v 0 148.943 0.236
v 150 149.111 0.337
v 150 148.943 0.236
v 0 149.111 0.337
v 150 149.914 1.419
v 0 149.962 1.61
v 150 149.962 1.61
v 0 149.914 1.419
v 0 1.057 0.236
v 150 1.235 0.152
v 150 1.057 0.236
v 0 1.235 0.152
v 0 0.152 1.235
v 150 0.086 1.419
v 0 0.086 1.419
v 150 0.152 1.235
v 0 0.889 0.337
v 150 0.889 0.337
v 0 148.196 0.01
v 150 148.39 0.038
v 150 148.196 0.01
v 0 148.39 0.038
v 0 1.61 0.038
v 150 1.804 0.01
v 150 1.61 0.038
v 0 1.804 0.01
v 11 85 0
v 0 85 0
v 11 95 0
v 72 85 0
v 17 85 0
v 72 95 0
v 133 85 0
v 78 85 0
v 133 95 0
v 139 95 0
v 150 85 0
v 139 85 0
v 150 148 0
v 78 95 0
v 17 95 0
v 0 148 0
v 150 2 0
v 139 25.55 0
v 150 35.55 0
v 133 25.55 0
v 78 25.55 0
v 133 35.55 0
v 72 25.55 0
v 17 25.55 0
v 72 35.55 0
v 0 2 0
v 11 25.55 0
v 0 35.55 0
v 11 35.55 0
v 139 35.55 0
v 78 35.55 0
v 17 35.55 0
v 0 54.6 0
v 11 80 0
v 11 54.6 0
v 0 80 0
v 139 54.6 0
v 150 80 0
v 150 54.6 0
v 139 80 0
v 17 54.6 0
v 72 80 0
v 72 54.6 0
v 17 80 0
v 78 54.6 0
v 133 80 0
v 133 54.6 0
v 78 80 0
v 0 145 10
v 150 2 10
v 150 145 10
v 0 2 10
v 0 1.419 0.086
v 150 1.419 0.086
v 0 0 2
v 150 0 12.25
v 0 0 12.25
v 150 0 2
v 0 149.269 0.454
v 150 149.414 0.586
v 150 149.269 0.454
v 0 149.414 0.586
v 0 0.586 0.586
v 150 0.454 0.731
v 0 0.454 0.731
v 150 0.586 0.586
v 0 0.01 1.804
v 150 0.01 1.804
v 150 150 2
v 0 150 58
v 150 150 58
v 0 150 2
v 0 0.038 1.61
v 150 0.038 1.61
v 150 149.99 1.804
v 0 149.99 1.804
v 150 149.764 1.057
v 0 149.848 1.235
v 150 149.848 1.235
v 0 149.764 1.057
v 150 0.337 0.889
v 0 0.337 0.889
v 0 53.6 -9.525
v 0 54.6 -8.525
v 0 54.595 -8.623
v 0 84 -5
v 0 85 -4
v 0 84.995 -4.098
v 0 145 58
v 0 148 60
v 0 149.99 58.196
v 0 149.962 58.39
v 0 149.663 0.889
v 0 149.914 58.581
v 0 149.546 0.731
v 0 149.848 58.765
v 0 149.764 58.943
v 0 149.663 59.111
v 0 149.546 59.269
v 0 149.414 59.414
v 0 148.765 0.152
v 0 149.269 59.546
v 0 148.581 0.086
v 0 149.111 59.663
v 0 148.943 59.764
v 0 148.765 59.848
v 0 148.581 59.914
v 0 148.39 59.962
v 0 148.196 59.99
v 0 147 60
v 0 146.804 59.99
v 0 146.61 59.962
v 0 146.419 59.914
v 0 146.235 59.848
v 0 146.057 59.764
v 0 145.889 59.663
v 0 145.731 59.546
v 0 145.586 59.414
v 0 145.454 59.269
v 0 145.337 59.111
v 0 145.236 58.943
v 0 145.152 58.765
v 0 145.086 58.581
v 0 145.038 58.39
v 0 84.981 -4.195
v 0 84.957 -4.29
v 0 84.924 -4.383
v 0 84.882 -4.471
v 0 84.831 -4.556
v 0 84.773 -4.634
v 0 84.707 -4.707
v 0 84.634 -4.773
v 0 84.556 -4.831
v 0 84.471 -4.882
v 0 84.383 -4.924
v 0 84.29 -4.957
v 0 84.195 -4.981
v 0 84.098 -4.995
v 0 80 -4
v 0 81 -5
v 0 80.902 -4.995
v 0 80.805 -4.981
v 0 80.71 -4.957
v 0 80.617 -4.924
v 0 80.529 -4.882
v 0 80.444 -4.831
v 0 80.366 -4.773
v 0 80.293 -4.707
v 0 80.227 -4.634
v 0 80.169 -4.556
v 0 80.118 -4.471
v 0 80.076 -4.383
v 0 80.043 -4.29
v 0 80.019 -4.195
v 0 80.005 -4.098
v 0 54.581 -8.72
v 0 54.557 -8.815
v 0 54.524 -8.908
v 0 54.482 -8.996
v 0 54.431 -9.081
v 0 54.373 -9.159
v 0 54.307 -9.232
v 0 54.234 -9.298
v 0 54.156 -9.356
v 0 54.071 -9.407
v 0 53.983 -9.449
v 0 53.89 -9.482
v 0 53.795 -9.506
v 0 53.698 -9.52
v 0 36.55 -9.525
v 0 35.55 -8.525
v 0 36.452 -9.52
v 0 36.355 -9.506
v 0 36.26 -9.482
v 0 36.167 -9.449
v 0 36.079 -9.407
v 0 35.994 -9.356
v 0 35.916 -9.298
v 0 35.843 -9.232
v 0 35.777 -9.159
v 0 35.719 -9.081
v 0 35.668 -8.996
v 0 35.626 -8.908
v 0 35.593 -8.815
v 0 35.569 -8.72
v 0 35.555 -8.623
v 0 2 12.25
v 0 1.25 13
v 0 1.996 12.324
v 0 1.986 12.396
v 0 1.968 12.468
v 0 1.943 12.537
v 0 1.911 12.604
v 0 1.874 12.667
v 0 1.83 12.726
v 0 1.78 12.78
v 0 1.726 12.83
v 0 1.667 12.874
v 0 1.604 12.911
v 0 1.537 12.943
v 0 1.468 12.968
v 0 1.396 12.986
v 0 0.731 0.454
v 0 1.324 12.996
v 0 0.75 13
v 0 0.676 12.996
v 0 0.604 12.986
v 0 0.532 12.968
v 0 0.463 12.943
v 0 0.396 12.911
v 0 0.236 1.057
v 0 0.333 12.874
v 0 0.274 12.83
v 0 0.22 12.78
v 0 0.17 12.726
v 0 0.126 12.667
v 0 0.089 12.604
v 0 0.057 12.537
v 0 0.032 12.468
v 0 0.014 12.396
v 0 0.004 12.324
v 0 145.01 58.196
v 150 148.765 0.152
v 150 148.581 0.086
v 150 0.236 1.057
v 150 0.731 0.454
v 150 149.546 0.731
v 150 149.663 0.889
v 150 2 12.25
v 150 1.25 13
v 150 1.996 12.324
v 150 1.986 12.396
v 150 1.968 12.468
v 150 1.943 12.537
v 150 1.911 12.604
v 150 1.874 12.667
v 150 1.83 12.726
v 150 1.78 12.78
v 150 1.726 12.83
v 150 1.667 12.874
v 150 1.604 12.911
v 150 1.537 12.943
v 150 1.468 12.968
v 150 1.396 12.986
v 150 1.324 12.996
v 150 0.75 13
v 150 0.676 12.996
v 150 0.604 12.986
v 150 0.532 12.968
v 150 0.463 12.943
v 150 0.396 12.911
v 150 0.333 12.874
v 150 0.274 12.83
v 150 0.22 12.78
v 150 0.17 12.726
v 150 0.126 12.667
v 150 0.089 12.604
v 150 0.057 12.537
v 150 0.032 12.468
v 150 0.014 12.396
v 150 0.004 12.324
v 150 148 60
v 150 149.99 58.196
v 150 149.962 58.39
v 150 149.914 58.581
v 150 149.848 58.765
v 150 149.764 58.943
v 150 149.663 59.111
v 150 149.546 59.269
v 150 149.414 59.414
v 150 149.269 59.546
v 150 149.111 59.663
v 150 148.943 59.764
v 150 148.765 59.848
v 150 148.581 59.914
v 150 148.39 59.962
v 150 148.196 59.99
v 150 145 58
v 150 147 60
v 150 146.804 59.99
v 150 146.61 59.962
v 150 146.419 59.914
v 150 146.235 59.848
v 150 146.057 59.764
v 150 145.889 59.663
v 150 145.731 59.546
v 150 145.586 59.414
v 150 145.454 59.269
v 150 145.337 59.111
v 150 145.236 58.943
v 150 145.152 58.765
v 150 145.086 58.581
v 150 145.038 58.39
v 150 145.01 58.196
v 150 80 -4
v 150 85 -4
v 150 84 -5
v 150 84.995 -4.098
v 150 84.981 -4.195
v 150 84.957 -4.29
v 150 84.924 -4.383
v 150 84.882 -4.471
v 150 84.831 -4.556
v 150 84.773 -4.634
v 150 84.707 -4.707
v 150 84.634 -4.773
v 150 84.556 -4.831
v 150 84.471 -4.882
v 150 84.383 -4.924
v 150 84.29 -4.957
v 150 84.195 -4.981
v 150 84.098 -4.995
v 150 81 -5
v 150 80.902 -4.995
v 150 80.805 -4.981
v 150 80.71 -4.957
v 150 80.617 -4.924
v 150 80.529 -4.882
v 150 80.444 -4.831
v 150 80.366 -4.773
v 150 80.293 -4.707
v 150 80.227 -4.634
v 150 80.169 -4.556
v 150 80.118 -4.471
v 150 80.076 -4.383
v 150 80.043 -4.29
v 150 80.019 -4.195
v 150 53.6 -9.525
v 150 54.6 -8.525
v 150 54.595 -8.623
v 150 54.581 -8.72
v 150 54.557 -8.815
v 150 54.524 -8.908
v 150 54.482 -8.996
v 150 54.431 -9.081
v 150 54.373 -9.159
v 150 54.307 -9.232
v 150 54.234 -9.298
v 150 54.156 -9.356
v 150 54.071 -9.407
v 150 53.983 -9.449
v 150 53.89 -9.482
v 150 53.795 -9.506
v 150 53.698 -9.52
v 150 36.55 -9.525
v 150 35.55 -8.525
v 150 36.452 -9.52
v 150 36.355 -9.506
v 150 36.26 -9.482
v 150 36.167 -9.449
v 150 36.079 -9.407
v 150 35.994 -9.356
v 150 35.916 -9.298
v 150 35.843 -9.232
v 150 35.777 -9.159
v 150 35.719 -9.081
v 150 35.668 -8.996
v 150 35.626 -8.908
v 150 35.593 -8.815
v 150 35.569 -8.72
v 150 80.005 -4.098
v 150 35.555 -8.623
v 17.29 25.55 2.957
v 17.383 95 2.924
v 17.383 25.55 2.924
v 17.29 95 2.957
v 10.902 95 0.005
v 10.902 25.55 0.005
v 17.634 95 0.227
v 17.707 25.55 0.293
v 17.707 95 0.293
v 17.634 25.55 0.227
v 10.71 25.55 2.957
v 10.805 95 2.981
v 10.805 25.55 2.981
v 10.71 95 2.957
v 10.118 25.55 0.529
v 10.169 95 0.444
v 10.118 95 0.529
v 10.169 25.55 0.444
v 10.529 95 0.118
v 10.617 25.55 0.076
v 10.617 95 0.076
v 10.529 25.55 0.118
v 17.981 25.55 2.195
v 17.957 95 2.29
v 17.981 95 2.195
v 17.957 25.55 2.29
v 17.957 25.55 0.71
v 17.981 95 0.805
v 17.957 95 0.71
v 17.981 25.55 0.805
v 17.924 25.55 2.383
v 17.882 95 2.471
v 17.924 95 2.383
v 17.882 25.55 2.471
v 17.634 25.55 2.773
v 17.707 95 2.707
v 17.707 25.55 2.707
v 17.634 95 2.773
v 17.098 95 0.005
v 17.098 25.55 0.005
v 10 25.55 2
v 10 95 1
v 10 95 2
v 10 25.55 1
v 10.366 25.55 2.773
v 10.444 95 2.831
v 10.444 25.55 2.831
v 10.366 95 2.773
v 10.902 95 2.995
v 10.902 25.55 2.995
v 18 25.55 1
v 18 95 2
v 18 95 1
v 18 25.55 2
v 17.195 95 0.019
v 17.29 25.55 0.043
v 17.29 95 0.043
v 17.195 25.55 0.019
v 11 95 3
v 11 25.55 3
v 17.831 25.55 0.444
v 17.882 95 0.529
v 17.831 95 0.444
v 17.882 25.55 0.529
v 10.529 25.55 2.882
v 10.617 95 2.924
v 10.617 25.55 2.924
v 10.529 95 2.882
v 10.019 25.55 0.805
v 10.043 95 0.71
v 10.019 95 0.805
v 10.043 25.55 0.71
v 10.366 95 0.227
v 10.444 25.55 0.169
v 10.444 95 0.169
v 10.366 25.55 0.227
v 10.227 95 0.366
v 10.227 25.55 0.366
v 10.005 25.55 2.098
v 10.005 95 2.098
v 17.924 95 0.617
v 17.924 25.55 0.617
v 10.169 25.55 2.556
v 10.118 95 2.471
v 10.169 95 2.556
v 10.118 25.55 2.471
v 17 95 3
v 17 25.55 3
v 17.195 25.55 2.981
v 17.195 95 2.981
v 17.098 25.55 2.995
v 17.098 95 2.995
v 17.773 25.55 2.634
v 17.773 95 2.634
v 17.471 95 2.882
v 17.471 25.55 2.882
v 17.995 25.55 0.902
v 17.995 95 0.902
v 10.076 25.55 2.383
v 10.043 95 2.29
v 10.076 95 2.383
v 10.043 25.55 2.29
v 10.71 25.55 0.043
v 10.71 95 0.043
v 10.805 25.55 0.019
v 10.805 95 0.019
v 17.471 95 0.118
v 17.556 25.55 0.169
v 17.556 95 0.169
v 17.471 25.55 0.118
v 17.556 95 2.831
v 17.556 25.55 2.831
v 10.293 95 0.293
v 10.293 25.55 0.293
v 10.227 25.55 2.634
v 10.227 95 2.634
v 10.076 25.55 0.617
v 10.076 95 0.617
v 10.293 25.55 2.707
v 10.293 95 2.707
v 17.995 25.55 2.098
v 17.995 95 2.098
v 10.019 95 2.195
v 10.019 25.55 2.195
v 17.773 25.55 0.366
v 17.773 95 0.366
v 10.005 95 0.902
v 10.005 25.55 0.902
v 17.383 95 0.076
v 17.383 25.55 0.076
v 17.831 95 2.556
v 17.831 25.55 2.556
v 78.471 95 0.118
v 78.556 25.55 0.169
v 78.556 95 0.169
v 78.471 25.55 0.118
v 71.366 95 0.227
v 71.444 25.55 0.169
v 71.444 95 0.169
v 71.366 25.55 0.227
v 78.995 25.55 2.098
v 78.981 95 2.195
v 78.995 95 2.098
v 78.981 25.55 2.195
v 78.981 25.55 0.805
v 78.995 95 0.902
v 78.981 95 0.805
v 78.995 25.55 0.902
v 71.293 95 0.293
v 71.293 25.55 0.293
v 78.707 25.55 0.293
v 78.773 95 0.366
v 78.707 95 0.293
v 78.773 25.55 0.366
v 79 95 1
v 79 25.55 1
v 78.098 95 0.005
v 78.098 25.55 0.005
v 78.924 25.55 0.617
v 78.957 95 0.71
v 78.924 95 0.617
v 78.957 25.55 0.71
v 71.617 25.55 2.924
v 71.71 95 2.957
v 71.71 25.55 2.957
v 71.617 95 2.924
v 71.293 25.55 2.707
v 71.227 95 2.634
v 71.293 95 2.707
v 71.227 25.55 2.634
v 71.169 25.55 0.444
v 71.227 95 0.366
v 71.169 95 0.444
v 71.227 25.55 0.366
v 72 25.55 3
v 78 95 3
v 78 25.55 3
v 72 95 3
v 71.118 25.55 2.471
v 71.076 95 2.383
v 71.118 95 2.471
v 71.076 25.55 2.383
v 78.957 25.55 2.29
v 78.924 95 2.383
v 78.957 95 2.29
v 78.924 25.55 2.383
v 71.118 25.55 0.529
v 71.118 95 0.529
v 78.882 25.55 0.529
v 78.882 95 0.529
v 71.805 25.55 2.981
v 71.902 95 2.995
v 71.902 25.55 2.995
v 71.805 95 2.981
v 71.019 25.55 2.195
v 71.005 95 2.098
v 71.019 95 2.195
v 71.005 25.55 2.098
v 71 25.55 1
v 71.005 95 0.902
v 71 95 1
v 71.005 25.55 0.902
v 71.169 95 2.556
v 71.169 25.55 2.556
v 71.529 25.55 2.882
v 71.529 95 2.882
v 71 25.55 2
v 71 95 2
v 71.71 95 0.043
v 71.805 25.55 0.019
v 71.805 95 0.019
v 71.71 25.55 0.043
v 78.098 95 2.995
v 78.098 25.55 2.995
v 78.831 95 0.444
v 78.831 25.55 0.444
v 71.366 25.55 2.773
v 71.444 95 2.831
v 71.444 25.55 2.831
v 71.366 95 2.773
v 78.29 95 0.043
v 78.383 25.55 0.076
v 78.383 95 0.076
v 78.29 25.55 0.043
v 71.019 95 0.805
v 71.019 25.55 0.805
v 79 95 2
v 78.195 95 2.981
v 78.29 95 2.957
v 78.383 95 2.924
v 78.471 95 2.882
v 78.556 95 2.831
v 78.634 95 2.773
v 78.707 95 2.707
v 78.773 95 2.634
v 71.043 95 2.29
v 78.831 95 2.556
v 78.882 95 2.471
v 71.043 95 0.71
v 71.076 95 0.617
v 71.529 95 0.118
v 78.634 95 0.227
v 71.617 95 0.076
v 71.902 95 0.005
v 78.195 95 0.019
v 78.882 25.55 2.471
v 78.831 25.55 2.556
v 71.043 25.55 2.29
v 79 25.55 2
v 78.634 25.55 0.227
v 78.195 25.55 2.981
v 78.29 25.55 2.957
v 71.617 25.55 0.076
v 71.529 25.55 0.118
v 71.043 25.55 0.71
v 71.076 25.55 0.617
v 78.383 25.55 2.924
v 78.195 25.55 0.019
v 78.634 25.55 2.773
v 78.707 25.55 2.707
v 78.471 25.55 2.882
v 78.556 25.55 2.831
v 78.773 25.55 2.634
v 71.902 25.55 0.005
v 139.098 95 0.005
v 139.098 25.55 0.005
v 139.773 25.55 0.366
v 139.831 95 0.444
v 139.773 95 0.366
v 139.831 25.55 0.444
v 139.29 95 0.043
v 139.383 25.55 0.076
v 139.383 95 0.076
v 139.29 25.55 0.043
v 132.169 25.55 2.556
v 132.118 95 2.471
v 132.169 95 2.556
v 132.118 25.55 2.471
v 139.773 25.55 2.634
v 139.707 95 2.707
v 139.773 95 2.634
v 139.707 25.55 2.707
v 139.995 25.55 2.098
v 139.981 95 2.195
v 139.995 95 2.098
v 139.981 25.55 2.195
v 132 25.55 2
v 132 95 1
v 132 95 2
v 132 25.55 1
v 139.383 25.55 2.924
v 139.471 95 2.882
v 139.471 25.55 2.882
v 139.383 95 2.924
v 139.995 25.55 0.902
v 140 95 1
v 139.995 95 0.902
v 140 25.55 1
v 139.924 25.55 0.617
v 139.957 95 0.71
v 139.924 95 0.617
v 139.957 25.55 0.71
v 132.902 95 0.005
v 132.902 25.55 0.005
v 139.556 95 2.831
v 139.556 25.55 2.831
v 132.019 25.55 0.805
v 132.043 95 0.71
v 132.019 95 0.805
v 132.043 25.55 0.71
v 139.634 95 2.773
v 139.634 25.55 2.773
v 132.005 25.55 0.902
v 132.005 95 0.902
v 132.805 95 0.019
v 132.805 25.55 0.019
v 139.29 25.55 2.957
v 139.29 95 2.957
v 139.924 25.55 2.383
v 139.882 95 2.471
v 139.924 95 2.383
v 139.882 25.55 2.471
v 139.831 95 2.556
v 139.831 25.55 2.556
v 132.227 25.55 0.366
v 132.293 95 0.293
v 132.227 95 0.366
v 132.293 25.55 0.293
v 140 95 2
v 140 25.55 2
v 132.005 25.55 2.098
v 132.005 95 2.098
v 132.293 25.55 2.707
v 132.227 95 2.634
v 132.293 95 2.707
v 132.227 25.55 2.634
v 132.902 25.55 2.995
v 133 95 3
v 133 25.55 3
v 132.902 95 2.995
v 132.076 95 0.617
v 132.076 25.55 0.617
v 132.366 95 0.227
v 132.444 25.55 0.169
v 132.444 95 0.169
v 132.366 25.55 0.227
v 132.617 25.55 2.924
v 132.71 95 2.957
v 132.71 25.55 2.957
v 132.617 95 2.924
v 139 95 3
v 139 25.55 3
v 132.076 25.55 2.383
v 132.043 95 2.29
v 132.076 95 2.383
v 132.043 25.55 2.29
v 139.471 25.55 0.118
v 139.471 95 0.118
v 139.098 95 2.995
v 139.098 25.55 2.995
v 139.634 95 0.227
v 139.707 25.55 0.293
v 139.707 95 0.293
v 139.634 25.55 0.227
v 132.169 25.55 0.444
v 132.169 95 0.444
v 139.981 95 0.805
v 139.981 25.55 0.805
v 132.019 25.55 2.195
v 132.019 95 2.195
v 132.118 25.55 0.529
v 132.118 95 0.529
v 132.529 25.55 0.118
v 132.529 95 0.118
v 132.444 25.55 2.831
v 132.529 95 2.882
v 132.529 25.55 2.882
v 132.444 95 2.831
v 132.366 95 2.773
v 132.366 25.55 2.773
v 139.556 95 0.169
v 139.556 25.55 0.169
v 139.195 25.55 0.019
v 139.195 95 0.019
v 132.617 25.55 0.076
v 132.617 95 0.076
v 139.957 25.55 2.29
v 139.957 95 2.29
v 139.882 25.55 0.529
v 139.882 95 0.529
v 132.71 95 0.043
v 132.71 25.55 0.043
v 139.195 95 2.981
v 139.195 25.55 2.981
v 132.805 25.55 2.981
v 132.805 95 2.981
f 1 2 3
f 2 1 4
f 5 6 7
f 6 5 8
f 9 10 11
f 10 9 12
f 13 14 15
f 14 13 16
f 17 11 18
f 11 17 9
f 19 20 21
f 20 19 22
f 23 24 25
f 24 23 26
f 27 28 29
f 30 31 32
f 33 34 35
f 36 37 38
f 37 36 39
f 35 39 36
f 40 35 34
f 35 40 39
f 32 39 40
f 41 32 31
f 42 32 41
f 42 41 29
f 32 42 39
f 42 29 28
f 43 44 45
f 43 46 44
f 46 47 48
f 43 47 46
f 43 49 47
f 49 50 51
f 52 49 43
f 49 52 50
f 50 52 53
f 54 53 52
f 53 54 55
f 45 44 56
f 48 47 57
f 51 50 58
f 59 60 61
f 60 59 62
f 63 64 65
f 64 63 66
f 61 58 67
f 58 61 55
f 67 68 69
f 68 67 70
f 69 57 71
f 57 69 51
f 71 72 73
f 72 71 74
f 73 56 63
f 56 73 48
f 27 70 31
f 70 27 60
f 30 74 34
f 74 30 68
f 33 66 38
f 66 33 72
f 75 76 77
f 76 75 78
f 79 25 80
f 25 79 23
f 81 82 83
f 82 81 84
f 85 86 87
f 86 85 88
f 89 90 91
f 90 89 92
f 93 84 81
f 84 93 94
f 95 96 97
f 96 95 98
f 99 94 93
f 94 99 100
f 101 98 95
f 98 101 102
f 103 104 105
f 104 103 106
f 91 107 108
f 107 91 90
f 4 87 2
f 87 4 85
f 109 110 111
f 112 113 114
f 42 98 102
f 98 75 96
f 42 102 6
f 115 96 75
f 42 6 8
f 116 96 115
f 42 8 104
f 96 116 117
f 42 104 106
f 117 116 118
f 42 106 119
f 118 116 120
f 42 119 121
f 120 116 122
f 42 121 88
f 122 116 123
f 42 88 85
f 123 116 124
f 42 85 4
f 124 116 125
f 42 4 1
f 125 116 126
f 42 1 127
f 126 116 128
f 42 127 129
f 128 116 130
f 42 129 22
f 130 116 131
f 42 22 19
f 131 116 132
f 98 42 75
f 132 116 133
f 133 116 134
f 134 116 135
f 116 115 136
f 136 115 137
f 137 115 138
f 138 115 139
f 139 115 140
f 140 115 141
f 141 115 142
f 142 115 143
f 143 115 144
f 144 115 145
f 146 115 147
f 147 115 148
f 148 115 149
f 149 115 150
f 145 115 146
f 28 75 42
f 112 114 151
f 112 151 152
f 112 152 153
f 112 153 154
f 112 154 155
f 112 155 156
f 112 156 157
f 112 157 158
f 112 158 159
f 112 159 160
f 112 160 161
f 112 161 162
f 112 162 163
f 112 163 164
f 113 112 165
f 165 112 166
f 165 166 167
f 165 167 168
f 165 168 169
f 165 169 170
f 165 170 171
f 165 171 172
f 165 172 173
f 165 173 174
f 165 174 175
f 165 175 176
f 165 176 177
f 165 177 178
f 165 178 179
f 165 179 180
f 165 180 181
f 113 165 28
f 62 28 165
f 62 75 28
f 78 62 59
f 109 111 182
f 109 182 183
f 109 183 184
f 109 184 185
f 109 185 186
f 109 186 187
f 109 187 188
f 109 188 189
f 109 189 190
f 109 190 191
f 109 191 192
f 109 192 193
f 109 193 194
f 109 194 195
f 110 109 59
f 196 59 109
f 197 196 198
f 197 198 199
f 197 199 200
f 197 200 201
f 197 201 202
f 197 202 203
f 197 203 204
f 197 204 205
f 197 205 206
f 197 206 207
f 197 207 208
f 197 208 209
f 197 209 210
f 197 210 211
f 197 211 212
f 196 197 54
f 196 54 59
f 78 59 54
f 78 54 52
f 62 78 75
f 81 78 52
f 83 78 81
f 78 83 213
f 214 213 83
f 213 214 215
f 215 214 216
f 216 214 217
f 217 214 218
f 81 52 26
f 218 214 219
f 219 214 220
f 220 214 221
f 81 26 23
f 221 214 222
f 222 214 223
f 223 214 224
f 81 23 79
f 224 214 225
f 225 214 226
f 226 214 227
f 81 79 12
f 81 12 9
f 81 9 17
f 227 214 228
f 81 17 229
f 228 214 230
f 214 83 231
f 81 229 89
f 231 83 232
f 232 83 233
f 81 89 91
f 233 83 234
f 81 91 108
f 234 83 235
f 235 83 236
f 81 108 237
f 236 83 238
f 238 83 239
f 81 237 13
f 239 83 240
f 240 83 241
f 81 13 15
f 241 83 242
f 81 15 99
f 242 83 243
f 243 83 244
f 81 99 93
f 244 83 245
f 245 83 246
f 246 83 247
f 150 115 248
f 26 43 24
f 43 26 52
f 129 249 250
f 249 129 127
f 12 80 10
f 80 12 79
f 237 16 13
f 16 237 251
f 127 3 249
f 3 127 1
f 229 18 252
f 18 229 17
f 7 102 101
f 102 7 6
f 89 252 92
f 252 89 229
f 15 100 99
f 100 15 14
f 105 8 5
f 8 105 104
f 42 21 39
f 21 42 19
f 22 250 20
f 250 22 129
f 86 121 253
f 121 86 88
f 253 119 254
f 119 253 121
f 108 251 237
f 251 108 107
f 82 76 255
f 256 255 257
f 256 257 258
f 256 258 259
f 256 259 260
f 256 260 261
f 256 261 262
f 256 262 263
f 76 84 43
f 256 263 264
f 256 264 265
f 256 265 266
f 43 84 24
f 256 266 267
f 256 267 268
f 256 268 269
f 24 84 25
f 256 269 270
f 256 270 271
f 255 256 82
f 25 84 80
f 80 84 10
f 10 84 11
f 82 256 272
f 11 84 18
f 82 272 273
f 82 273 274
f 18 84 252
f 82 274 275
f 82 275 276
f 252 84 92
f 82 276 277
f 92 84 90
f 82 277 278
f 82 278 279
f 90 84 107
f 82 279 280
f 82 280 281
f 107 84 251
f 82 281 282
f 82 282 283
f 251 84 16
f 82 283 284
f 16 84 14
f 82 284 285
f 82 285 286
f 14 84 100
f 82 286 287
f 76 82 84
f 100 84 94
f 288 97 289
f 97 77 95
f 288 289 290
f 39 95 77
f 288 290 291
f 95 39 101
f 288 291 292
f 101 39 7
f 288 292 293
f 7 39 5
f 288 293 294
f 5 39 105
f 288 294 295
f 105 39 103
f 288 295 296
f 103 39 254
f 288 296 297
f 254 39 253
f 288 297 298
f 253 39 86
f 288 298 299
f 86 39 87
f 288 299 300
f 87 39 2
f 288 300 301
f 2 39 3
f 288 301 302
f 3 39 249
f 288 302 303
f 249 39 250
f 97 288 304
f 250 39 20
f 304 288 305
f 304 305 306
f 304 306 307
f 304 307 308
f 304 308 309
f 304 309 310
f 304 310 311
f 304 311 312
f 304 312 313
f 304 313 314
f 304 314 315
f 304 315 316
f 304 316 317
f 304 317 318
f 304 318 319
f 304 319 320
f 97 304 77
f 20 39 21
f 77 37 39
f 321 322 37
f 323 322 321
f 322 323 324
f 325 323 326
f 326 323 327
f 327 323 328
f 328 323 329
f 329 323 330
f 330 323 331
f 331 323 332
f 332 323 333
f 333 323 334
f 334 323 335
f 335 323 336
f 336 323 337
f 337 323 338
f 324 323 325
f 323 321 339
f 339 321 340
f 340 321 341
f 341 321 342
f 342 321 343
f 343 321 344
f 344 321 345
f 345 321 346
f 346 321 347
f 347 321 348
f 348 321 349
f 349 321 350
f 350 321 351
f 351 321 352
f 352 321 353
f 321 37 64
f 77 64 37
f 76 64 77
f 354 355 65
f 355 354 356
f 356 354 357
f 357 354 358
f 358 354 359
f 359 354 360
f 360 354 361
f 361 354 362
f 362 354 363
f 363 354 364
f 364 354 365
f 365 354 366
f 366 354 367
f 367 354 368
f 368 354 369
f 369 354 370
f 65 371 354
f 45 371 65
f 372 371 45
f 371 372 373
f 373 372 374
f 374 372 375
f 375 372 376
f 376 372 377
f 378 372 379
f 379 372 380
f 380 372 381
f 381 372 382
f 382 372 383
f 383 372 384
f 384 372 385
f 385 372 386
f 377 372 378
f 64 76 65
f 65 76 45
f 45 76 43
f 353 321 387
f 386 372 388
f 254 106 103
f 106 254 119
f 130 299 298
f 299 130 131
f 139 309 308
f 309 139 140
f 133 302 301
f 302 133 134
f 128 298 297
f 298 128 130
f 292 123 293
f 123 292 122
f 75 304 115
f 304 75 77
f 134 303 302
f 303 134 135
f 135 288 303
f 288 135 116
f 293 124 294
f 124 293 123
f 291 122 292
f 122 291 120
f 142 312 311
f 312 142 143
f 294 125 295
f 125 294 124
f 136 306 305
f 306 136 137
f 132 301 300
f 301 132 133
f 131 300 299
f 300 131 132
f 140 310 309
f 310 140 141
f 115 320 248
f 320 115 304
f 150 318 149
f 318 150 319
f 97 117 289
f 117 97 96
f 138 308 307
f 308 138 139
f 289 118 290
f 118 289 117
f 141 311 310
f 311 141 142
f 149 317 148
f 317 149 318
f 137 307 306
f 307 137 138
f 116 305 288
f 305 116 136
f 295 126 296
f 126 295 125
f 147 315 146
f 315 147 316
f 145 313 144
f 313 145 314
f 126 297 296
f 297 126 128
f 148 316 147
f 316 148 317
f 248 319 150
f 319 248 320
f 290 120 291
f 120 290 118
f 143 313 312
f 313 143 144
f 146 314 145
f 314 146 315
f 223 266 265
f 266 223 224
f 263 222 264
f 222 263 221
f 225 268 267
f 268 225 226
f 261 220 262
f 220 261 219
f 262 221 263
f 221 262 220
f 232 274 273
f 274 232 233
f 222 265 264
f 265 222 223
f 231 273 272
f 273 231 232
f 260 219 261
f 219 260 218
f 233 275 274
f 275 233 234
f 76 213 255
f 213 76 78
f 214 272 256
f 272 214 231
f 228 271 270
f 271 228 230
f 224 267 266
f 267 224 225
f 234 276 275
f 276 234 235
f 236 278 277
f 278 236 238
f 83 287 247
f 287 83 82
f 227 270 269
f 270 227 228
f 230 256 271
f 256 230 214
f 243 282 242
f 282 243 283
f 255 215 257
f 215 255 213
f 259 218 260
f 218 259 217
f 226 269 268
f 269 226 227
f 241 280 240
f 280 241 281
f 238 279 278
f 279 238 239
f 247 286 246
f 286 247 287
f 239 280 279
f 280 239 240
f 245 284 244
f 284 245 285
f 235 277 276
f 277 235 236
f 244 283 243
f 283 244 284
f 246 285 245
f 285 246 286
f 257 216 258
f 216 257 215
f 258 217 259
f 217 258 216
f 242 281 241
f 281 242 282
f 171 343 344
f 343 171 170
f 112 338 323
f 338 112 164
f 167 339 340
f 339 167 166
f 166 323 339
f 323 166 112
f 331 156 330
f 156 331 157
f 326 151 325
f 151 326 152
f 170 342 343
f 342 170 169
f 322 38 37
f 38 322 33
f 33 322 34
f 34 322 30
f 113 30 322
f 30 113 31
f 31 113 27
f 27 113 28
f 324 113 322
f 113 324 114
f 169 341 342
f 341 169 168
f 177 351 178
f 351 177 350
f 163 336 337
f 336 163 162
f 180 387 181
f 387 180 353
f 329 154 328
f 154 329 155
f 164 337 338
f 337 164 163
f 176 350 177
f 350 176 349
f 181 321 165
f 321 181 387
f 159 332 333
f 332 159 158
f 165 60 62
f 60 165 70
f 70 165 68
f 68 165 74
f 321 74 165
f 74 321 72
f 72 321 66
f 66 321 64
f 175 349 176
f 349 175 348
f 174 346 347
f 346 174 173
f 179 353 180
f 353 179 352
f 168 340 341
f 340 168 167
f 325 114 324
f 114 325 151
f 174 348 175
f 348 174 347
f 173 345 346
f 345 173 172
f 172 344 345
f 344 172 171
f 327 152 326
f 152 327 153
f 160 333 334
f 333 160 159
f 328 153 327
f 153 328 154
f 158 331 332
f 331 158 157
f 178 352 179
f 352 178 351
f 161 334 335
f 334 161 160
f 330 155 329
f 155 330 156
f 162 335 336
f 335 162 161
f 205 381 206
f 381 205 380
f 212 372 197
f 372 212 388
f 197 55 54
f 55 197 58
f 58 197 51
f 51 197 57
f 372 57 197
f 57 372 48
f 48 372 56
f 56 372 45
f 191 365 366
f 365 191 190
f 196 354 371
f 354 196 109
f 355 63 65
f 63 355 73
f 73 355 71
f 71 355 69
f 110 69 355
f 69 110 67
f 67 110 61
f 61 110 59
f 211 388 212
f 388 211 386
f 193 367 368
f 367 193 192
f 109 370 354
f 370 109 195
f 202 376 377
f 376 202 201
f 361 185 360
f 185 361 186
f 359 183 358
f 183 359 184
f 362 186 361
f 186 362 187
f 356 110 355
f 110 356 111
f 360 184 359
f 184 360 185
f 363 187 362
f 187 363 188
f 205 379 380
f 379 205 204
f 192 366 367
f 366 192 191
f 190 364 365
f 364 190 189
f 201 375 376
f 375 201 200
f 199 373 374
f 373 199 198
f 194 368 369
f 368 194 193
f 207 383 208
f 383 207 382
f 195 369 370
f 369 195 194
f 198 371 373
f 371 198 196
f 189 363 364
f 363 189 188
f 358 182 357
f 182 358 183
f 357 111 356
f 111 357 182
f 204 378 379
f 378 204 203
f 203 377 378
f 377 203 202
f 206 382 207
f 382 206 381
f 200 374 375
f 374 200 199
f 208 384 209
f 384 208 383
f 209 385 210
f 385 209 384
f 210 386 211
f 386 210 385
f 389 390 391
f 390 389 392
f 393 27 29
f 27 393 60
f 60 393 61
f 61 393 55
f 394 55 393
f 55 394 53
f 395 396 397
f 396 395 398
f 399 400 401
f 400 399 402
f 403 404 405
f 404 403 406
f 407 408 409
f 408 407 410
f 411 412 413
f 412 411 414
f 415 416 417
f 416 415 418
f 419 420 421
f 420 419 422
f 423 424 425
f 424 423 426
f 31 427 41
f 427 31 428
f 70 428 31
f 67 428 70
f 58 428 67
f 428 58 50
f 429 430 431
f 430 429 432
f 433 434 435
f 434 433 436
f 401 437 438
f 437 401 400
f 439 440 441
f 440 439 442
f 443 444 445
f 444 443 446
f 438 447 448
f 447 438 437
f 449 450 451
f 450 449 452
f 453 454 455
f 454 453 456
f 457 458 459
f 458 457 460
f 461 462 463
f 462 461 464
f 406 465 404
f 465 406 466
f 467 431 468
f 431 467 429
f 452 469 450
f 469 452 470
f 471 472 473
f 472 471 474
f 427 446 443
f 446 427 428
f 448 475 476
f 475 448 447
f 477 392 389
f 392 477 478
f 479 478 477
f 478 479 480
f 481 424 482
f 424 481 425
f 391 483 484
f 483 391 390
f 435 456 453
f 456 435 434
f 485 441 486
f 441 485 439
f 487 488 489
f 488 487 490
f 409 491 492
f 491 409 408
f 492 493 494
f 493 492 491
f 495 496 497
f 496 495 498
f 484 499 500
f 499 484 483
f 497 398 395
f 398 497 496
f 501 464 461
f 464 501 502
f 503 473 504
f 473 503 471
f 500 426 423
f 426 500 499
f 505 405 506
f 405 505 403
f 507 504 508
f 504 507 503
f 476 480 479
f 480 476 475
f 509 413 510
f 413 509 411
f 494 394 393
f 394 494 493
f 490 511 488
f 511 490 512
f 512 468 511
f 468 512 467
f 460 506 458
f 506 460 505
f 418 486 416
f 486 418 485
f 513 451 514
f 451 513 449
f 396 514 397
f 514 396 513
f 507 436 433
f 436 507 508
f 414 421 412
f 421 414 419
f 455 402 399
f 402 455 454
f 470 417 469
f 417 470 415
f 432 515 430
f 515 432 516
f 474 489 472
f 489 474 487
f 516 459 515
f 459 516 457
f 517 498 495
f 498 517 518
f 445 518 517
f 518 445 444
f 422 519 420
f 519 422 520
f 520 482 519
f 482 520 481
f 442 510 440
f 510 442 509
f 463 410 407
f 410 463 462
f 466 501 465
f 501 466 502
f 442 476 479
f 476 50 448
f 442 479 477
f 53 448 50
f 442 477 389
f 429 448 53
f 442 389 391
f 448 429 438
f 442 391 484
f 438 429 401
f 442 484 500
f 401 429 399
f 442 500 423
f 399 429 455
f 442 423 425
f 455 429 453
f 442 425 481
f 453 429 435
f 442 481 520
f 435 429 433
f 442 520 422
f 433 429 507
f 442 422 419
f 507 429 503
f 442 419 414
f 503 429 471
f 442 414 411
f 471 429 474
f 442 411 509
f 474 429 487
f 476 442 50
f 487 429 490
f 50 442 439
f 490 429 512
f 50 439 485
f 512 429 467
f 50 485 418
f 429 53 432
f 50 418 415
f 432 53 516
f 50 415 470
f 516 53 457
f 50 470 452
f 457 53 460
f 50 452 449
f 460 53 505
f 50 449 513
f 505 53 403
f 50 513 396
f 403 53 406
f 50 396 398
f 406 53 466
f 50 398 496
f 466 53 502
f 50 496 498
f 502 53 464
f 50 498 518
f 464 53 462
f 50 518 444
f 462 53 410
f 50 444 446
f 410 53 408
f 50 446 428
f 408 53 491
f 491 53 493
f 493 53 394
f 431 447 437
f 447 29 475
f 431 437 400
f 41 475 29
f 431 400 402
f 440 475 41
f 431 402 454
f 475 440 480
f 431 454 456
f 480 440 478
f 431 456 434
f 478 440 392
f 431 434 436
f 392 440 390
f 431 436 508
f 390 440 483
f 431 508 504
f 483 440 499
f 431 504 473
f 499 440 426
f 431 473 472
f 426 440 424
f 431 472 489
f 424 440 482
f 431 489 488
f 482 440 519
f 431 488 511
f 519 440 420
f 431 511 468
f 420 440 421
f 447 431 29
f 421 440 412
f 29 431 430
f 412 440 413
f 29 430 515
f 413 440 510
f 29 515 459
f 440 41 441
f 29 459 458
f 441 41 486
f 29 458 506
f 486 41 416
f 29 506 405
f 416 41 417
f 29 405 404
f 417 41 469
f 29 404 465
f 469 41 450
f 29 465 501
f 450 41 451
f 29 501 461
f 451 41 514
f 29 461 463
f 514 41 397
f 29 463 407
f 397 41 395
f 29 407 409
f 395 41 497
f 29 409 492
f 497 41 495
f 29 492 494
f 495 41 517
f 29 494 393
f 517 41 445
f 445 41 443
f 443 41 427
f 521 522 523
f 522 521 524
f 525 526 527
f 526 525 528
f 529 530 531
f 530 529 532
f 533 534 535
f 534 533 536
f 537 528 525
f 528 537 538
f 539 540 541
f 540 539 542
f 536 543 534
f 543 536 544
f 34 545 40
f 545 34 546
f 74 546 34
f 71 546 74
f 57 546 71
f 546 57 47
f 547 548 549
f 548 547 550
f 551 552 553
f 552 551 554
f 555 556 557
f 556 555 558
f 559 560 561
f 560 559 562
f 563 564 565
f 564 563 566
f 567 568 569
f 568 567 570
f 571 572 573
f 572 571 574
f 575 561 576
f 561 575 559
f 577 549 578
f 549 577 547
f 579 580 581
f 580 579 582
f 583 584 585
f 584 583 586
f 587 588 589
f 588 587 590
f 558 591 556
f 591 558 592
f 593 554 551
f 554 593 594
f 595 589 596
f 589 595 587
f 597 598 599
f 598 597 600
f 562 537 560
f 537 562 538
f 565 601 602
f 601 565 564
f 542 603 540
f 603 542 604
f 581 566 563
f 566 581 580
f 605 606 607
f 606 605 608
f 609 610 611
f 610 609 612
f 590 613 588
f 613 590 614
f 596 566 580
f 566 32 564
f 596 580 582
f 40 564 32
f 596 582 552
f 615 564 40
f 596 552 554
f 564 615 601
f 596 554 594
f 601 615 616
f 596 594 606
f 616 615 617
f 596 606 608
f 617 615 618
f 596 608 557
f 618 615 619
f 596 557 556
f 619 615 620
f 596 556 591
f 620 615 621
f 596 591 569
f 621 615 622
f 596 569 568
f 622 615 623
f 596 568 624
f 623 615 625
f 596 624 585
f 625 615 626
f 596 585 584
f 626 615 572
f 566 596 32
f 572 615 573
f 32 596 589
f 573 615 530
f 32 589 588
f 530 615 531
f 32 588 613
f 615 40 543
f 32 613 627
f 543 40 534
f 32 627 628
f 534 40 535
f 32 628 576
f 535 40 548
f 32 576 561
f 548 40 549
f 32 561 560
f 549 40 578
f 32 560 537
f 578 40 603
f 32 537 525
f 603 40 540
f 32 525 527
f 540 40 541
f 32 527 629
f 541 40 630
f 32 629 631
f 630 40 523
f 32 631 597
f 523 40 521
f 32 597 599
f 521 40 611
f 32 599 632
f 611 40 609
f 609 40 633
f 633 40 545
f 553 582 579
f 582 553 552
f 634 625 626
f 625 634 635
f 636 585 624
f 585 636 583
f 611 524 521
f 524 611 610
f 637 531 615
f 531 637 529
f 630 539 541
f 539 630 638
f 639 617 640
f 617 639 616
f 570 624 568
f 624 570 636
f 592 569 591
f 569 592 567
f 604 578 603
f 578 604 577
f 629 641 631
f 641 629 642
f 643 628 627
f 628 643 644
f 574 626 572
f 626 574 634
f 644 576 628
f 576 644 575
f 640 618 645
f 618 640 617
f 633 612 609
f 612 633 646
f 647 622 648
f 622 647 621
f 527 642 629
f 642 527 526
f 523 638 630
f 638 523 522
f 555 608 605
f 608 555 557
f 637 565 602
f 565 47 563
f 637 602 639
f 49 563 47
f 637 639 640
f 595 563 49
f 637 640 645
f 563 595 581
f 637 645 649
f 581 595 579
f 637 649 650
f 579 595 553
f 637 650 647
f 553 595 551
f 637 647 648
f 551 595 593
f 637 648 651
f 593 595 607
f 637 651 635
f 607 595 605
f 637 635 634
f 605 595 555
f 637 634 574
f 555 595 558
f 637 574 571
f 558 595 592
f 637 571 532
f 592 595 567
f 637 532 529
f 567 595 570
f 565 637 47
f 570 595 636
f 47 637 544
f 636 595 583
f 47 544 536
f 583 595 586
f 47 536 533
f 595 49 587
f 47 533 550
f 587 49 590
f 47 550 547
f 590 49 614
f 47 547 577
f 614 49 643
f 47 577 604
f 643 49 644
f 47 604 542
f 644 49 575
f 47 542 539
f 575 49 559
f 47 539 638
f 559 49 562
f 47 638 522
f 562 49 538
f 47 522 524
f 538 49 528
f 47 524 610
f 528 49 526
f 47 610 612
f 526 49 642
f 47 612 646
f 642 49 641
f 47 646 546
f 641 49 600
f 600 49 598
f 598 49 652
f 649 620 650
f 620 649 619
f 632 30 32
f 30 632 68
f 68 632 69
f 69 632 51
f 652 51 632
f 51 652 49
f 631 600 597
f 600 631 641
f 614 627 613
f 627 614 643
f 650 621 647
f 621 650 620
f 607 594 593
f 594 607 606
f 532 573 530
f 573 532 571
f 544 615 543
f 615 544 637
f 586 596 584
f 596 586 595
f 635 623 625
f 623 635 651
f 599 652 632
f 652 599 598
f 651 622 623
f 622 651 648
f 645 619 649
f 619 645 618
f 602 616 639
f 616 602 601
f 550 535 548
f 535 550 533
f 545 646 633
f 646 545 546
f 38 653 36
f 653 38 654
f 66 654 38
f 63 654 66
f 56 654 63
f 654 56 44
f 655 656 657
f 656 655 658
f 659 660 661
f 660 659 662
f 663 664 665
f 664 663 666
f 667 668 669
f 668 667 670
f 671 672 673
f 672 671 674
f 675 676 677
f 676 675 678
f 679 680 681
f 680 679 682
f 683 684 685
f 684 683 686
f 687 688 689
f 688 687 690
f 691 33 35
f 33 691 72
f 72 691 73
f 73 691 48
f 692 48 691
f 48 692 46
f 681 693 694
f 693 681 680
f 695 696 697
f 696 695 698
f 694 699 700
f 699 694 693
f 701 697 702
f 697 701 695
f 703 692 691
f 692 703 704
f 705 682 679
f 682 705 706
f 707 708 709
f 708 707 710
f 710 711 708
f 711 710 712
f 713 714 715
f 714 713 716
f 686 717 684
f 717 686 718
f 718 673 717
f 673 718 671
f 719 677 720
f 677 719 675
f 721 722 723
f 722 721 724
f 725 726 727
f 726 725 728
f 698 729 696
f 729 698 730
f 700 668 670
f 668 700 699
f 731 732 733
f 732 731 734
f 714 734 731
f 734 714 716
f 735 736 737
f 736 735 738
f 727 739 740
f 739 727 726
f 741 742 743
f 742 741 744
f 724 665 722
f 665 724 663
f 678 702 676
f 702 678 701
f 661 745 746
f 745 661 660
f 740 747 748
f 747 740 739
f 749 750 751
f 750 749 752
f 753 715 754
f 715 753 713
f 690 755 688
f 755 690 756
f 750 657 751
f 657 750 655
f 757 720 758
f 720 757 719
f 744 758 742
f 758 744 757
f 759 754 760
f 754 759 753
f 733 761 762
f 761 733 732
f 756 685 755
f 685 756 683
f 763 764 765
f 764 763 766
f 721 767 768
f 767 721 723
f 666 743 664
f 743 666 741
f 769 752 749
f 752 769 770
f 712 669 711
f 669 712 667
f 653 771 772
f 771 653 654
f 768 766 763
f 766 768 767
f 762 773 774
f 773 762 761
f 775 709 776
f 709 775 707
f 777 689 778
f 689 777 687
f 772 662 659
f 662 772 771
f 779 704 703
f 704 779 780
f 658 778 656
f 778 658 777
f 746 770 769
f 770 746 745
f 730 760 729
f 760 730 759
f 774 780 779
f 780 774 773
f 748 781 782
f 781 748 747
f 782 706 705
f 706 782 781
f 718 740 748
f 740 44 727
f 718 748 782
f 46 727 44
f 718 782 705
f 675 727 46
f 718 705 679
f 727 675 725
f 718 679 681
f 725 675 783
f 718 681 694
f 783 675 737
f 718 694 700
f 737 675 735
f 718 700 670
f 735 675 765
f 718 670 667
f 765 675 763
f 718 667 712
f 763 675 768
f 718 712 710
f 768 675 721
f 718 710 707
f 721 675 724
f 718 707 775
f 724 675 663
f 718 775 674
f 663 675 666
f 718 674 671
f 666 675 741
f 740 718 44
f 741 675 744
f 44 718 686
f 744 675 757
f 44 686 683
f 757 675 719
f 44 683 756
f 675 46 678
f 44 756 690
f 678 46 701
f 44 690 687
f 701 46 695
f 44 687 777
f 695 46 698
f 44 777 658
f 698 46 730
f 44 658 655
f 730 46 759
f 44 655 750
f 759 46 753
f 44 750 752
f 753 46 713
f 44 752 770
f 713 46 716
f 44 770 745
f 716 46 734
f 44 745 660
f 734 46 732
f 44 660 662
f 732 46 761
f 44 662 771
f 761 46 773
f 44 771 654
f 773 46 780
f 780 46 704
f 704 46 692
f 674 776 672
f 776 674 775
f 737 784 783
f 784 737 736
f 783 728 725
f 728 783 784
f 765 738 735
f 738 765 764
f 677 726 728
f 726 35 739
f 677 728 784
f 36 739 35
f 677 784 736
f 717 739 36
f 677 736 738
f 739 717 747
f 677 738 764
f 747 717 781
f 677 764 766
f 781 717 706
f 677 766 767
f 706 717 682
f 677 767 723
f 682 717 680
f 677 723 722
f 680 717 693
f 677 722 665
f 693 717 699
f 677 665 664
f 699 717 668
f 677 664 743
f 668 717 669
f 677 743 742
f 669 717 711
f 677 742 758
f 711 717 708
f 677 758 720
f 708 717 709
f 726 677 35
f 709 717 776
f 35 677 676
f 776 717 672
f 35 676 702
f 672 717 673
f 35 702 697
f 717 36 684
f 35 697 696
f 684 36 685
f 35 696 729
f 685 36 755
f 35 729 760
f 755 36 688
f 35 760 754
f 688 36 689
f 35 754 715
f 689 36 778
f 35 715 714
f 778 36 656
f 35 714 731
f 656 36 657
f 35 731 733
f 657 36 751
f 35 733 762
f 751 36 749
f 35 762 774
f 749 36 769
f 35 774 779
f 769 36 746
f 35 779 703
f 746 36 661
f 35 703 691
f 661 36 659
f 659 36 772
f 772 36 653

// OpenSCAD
// file: 72-inch-cosco-profile.scad
// 72-inch Cosco shelf profile.
//
// Overrides the bar / front-lip dimensions in bar_shelf.scad to fit a
// 72-inch Cosco shelving rail. Include this BEFORE bar_shelf.scad in any
// wrapper that should use the Cosco profile.
border_ridge_override     = 25.4;    // 1"
border_depth_override     = 19.05;   // 3/4"
border_height_override    = 9.525;   // 3/8"
rear_wall_height_override = 5;       // shorter rear lip than 77-inch industrial
// main file
// 150mm-wide 72-inch Cosco shelf — see bar_shelf.scad for the design.
include <72-inch-cosco-profile.scad>
shelf_width_override = 150;
include <bar_shelf.scad>
